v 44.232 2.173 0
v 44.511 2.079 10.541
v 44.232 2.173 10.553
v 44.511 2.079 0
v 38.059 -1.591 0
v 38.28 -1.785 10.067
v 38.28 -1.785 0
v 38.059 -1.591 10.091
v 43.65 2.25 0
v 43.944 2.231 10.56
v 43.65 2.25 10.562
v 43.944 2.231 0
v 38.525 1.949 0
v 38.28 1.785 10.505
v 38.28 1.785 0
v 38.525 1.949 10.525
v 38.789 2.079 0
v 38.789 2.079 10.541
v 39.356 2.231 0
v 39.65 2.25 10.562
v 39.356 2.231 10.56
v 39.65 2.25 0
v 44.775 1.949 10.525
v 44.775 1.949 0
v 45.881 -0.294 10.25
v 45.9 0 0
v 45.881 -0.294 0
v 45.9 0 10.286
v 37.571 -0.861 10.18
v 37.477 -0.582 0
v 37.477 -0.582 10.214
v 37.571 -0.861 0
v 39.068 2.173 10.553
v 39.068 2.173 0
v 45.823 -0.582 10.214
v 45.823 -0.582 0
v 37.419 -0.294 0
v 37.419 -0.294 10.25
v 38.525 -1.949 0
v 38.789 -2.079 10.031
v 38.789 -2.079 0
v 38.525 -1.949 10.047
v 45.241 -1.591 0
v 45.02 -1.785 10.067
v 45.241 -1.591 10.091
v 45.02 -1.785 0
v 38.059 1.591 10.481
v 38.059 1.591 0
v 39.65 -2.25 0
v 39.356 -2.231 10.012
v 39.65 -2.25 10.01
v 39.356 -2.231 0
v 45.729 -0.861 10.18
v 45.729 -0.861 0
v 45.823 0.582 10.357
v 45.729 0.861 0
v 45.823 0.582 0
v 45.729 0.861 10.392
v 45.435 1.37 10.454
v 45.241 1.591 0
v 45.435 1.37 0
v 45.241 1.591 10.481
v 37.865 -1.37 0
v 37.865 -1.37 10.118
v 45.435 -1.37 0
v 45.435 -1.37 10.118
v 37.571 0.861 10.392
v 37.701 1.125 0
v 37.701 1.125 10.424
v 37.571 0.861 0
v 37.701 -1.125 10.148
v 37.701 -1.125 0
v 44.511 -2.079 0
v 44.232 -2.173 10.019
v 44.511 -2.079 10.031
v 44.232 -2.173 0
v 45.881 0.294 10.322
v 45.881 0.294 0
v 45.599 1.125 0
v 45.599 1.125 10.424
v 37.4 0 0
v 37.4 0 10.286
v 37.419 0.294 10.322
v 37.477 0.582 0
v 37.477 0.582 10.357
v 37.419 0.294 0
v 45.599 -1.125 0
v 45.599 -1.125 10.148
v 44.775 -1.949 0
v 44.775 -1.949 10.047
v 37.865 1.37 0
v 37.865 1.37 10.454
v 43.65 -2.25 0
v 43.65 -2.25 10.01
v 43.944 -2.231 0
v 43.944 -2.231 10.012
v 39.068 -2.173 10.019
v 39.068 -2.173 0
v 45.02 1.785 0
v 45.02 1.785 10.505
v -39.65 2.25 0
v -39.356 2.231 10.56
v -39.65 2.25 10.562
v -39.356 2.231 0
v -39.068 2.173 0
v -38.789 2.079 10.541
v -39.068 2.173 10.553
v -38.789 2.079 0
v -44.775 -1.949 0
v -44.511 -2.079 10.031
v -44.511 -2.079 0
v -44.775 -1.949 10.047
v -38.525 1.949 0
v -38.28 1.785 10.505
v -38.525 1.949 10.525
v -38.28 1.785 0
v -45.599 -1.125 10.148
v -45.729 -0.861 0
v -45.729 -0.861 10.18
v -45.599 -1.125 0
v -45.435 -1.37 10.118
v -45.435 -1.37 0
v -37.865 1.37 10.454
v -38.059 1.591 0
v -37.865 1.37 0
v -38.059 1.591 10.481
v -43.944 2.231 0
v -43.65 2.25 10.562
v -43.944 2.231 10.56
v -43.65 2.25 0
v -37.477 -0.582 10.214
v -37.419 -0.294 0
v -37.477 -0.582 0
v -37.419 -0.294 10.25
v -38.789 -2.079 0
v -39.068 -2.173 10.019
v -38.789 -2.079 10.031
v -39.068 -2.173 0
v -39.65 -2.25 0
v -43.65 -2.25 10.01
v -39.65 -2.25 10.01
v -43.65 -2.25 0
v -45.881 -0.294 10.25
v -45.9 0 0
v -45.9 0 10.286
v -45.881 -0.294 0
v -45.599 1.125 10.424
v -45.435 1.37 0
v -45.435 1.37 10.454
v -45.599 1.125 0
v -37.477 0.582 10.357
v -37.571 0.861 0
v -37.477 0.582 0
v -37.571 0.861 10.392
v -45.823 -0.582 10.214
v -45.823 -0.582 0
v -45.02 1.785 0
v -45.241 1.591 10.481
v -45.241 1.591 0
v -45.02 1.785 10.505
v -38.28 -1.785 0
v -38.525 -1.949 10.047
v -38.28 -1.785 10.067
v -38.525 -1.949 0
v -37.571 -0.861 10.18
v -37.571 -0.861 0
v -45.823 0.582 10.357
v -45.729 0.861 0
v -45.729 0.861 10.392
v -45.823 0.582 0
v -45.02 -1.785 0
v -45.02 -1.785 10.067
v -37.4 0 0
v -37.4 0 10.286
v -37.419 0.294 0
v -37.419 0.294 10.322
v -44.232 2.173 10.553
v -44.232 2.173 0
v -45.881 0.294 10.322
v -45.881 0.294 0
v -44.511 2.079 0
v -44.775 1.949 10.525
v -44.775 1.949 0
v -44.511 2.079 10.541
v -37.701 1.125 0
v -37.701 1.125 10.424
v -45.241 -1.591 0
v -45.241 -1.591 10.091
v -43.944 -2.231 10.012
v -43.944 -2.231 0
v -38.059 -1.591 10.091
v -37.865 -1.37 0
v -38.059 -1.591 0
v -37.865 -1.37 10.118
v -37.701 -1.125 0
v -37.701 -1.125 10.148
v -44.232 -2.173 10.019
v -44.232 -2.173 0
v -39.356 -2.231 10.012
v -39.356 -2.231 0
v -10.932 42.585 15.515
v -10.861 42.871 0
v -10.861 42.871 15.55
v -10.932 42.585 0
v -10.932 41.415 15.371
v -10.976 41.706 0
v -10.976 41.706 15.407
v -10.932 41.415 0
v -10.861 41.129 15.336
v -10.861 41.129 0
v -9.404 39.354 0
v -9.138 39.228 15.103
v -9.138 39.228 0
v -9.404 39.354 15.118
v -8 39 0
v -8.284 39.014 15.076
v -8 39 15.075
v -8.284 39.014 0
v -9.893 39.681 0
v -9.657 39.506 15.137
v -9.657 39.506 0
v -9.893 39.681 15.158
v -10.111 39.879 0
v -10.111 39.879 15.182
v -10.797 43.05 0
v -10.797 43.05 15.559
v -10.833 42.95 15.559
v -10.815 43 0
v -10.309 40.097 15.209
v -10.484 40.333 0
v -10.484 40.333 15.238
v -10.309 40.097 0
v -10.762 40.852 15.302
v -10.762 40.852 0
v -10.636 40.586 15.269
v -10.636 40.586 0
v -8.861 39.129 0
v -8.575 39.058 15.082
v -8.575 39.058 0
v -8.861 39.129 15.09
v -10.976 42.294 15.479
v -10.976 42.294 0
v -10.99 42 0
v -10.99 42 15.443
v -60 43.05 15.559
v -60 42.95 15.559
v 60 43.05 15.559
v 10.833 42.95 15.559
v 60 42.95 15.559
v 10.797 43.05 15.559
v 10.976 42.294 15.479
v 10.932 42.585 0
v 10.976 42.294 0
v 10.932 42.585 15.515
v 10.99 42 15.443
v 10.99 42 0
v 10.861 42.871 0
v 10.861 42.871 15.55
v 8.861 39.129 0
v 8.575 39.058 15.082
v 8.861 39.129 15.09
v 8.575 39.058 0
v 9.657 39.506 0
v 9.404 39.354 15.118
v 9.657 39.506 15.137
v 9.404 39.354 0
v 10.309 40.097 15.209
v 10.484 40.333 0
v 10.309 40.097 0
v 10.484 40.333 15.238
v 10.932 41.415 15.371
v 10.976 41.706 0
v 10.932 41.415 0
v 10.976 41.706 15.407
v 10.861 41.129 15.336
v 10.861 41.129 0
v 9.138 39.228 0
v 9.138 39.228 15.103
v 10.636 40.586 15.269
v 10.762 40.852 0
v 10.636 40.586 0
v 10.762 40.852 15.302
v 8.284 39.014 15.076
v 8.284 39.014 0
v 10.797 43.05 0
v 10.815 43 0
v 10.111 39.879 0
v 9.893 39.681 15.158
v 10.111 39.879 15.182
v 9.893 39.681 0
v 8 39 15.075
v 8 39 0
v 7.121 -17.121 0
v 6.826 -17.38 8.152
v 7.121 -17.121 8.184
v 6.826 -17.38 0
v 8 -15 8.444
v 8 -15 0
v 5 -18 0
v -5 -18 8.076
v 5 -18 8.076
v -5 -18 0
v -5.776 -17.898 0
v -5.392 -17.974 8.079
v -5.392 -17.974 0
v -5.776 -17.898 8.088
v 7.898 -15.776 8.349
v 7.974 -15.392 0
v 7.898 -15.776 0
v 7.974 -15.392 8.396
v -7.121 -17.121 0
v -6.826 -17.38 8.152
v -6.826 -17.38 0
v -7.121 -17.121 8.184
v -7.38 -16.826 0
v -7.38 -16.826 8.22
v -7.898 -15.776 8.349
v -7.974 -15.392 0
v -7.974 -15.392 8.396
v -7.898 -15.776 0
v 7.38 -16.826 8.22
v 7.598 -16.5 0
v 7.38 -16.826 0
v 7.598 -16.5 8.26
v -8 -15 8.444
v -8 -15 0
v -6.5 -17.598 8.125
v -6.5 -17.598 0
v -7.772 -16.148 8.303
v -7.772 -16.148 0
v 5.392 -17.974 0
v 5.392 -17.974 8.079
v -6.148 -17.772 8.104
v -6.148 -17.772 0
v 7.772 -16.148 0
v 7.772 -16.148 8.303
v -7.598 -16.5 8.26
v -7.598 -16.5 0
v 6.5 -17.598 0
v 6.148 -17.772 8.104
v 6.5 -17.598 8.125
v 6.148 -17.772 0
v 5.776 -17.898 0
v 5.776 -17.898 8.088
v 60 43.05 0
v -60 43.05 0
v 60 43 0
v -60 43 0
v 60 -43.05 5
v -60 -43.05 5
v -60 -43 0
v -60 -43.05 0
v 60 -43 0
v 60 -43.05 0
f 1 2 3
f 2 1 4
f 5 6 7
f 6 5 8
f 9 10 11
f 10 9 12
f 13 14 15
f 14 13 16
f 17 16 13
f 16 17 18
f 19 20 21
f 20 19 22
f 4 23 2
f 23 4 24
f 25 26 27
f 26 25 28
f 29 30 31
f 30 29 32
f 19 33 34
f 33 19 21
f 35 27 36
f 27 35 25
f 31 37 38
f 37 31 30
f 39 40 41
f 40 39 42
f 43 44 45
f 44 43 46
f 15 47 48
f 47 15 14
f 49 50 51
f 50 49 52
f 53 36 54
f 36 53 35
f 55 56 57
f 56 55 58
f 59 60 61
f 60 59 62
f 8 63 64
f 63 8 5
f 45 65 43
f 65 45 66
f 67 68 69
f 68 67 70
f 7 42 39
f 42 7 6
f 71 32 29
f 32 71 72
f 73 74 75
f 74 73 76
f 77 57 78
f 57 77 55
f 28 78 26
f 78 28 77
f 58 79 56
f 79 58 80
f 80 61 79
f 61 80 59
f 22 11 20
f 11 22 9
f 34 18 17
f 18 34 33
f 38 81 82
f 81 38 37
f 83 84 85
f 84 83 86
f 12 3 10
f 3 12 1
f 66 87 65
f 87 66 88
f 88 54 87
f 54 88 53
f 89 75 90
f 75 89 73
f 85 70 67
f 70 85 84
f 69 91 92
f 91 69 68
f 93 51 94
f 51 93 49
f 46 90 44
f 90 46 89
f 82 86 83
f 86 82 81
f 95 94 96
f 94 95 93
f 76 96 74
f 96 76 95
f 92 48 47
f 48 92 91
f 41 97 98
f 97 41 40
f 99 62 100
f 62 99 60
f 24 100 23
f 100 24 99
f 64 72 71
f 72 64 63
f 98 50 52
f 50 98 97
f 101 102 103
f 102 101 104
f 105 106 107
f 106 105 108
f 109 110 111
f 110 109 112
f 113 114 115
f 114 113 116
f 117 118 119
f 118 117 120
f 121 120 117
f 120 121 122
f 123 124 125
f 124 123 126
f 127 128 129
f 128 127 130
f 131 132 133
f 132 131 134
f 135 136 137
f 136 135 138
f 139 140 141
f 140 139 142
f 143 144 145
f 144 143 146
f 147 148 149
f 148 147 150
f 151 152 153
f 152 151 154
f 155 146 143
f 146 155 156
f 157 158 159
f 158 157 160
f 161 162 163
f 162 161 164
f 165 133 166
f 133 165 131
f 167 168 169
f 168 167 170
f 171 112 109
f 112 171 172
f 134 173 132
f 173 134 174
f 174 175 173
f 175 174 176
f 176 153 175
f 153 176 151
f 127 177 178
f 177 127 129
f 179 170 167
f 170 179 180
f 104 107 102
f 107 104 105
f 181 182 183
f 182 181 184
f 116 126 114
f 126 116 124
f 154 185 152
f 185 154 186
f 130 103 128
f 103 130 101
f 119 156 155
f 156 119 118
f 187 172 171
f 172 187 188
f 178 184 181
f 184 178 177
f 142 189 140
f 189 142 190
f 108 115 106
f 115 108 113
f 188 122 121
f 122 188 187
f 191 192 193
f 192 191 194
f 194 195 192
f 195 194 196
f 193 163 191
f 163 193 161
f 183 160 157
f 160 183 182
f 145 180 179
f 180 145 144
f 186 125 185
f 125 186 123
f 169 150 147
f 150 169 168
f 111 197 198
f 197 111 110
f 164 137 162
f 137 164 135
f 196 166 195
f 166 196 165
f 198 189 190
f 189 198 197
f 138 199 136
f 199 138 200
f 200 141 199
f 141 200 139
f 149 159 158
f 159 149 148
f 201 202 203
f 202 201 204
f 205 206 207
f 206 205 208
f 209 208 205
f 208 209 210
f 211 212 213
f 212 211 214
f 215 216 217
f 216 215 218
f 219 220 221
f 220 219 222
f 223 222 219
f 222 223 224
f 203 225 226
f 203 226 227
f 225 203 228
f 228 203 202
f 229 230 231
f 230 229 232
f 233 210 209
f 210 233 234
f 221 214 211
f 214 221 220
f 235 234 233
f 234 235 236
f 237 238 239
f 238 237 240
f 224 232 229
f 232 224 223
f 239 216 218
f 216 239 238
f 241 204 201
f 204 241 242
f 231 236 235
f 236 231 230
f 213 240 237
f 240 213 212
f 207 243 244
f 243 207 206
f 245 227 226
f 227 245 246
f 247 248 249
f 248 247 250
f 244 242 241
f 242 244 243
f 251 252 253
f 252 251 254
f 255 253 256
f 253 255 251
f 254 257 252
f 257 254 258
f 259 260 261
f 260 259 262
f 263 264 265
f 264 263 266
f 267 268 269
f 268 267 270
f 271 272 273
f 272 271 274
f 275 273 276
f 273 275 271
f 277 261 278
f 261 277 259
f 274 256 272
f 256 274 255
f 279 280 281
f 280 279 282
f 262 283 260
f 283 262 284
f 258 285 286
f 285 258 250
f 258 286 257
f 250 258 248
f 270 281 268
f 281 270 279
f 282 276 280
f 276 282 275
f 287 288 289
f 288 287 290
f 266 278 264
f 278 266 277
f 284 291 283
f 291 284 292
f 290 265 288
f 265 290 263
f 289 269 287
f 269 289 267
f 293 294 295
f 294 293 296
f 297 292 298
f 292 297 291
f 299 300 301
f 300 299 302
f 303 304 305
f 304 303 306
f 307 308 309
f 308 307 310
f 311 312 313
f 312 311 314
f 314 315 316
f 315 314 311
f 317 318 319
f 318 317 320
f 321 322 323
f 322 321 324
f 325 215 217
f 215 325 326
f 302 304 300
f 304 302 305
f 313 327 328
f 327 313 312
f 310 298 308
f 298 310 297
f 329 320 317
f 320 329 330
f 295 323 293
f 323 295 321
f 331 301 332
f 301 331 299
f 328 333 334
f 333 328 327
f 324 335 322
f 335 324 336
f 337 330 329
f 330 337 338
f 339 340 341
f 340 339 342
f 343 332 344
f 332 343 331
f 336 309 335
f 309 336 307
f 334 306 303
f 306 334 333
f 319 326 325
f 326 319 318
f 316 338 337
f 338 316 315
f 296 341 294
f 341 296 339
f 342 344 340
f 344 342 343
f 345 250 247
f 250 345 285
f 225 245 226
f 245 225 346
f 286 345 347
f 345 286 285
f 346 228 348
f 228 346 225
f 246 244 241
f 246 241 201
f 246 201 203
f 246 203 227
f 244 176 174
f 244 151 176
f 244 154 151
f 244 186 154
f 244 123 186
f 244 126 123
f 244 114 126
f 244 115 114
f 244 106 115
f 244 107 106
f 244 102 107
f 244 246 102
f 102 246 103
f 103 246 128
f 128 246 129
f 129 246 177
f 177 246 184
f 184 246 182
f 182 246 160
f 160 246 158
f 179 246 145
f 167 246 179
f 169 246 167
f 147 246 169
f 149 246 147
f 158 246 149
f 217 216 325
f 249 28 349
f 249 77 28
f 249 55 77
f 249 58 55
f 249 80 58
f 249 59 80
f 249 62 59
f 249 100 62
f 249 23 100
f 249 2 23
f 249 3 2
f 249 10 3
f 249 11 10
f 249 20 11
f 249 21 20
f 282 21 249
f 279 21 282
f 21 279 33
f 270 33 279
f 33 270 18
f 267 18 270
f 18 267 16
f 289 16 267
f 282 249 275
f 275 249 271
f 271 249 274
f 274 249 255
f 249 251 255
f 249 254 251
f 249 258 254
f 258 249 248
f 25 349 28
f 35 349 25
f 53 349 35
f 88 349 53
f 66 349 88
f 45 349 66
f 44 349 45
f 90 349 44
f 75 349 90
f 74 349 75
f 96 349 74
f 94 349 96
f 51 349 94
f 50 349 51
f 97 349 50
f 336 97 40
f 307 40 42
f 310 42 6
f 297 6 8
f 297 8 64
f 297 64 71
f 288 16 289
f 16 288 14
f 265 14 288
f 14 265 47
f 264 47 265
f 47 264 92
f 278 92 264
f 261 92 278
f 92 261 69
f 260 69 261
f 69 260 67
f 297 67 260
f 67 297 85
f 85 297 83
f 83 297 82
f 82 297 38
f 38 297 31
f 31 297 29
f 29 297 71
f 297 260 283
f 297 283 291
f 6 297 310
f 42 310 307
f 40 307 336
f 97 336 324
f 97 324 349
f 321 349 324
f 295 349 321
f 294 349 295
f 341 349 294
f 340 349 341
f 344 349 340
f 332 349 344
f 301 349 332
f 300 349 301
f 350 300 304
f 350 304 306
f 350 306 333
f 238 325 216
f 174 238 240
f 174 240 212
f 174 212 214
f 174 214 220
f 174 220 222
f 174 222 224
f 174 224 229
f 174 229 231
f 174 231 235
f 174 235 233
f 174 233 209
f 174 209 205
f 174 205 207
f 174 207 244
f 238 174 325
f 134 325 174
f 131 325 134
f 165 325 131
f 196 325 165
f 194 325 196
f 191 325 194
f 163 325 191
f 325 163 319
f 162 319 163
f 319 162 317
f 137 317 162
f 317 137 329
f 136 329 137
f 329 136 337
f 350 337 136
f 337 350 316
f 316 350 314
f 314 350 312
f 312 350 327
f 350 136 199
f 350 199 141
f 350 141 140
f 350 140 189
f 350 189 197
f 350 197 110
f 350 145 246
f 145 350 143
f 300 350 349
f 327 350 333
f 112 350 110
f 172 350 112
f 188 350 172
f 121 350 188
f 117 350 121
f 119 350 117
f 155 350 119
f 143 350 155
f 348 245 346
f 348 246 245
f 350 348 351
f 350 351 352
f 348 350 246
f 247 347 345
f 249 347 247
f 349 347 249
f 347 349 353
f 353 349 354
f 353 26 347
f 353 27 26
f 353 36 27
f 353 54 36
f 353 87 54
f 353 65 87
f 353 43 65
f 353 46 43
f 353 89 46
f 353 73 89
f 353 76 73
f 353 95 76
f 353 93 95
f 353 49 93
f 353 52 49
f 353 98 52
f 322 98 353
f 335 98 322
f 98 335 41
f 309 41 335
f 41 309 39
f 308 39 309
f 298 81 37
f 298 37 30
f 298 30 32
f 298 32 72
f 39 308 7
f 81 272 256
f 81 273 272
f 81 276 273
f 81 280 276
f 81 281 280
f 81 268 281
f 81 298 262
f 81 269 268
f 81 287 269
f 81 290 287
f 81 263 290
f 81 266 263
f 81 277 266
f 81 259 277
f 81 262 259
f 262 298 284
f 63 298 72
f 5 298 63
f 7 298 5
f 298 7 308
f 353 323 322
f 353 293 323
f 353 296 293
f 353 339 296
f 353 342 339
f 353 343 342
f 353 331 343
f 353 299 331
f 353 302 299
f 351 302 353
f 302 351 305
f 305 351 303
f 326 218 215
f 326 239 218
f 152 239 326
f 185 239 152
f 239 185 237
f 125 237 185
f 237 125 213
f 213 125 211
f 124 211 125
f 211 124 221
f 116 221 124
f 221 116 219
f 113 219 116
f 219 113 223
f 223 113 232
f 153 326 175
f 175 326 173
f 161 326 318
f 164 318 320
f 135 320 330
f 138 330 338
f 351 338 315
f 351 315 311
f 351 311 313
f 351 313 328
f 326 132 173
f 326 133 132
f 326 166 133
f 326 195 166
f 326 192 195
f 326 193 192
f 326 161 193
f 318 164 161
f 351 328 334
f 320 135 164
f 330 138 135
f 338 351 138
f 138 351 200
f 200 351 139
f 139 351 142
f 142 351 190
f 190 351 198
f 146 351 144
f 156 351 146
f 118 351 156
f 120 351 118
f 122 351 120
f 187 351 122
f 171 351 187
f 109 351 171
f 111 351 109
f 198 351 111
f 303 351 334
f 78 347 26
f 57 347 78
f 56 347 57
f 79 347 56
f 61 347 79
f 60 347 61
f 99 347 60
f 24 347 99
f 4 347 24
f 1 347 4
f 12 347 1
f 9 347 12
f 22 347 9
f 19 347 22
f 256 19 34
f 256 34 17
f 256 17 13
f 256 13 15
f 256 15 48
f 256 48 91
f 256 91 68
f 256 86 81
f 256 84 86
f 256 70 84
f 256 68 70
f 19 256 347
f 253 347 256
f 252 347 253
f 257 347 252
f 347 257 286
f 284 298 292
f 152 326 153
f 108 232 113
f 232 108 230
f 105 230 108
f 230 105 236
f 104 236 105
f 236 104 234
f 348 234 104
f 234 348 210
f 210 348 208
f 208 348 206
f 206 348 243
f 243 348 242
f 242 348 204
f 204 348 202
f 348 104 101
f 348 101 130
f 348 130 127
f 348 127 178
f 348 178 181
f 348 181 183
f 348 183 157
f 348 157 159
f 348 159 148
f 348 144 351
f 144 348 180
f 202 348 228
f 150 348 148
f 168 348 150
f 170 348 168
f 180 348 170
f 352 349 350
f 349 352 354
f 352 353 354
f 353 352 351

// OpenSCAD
// --- EAP615-Wall wedge spacer (single piece, prints flat) ---
plate_x   = 120;
plate_y   = 86;
thin_z    = 5;
tilt_deg  = 7;
flip_tilt = false;

// device/yoke mount (US)
device_spacing = 83.3;
use_slots      = true;
slot_play_x    = 4;
device_hole_d  = 4.5;
cbore_d        = 8;
cbore_h        = 1.5;

// cable cutout (RJ45 access)
cutout_w      = 16;
cutout_h      = 20;
cutout_offset = 0;
round_r       = 3;
epsY_in       = 20;
epsY_out = 0;   // was 1.0

// mouth rounding
lip_r         = 3.0;
lip_inset     = 1.0;  // how far INSIDE thick edge to start rounding

thick_z = thin_z + plate_y * tan(tilt_deg);
echo("Computed thin_z =", thin_z, "mm");
echo("Computed thick_z =", thick_z, "mm");

module wedge_block(){
  y_thin  =  flip_tilt ?  plate_y/2 : -plate_y/2;
  y_thick = !flip_tilt ?  plate_y/2 : -plate_y/2;
  hull(){
    translate([0, y_thin,  thin_z/2])  cube([plate_x, 0.1, thin_z],  center=true);
    translate([0, y_thick, thick_z/2]) cube([plate_x, 0.1, thick_z], center=true);
    translate([0, 0, 0]) cube([plate_x, plate_y, 0.001], center=true);
  }
}

module rounded_box(x, y, z, r){
  r2 = min(r, min(x,y)/2);
  if (r2 <= 0) cube([x,y,z], center=true);
  else minkowski(){
    cube([x-2*r2, y-2*r2, z], center=true);
    cylinder(r=r2, h=0.001, $fn=48);
  }
}

module slotX(d=4.5, len=4){
  hull(){
    translate([-len/2, 0, 0]) cylinder(h=thick_z+1, d=d, center=true, $fn=48);
    translate([+len/2, 0, 0]) cylinder(h=thick_z+1, d=d, center=true, $fn=48);
  }
}

// device screw positions (aligned along X)
device_positions = [
  [ +device_spacing/2, 0 ],
  [ -device_spacing/2, 0 ]
];

difference(){
  wedge_block();

  union(){

    // device slots
    if (use_slots){
      for (p = device_positions)
        translate([p[0], p[1], thick_z/2]) slotX(d=device_hole_d, len=slot_play_x);
    } else {
      for (p = device_positions)
        translate([p[0], p[1], -0.5])
          cylinder(h=thick_z+1, d=device_hole_d, $fn=64);
    }

    // counterbore
    for (p = device_positions)
      translate([p[0], p[1], thick_z - cbore_h])
        cylinder(h=cbore_h+0.01, d=cbore_d, $fn=64);

    // RJ45 cable cutout
    y_thick_edge = (!flip_tilt ?  plate_y/2 + 2 : -plate_y/2 - 2);
    dir          = (!flip_tilt ? 1 : -1);
    L_in         = plate_y/2 + epsY_in;
    L_out        = epsY_out;
    cutout_depth = L_in + L_out;
    cut_y        = y_thick_edge - dir * ((L_in - L_out)/2.0);
    cut_z        = thick_z - cutout_h/2;

    translate([cutout_offset, cut_y, cut_z])
      rounded_box(cutout_w, cutout_depth, cutout_h, round_r);
    
    

    // --- fixed: subtle internal round-over at slot mouth ---
    mouth_y = (!flip_tilt ?  plate_y/2 - lip_inset : -plate_y/2 + lip_inset);
    for (sx = [-1, 1])
      translate([
        cutout_offset + sx*(cutout_w/2 - 0.01),
        mouth_y,
        thick_z - cutout_h/2
      ])
        cylinder(h=cutout_h, r=lip_r, center=true, $fn=64);

  }
}
